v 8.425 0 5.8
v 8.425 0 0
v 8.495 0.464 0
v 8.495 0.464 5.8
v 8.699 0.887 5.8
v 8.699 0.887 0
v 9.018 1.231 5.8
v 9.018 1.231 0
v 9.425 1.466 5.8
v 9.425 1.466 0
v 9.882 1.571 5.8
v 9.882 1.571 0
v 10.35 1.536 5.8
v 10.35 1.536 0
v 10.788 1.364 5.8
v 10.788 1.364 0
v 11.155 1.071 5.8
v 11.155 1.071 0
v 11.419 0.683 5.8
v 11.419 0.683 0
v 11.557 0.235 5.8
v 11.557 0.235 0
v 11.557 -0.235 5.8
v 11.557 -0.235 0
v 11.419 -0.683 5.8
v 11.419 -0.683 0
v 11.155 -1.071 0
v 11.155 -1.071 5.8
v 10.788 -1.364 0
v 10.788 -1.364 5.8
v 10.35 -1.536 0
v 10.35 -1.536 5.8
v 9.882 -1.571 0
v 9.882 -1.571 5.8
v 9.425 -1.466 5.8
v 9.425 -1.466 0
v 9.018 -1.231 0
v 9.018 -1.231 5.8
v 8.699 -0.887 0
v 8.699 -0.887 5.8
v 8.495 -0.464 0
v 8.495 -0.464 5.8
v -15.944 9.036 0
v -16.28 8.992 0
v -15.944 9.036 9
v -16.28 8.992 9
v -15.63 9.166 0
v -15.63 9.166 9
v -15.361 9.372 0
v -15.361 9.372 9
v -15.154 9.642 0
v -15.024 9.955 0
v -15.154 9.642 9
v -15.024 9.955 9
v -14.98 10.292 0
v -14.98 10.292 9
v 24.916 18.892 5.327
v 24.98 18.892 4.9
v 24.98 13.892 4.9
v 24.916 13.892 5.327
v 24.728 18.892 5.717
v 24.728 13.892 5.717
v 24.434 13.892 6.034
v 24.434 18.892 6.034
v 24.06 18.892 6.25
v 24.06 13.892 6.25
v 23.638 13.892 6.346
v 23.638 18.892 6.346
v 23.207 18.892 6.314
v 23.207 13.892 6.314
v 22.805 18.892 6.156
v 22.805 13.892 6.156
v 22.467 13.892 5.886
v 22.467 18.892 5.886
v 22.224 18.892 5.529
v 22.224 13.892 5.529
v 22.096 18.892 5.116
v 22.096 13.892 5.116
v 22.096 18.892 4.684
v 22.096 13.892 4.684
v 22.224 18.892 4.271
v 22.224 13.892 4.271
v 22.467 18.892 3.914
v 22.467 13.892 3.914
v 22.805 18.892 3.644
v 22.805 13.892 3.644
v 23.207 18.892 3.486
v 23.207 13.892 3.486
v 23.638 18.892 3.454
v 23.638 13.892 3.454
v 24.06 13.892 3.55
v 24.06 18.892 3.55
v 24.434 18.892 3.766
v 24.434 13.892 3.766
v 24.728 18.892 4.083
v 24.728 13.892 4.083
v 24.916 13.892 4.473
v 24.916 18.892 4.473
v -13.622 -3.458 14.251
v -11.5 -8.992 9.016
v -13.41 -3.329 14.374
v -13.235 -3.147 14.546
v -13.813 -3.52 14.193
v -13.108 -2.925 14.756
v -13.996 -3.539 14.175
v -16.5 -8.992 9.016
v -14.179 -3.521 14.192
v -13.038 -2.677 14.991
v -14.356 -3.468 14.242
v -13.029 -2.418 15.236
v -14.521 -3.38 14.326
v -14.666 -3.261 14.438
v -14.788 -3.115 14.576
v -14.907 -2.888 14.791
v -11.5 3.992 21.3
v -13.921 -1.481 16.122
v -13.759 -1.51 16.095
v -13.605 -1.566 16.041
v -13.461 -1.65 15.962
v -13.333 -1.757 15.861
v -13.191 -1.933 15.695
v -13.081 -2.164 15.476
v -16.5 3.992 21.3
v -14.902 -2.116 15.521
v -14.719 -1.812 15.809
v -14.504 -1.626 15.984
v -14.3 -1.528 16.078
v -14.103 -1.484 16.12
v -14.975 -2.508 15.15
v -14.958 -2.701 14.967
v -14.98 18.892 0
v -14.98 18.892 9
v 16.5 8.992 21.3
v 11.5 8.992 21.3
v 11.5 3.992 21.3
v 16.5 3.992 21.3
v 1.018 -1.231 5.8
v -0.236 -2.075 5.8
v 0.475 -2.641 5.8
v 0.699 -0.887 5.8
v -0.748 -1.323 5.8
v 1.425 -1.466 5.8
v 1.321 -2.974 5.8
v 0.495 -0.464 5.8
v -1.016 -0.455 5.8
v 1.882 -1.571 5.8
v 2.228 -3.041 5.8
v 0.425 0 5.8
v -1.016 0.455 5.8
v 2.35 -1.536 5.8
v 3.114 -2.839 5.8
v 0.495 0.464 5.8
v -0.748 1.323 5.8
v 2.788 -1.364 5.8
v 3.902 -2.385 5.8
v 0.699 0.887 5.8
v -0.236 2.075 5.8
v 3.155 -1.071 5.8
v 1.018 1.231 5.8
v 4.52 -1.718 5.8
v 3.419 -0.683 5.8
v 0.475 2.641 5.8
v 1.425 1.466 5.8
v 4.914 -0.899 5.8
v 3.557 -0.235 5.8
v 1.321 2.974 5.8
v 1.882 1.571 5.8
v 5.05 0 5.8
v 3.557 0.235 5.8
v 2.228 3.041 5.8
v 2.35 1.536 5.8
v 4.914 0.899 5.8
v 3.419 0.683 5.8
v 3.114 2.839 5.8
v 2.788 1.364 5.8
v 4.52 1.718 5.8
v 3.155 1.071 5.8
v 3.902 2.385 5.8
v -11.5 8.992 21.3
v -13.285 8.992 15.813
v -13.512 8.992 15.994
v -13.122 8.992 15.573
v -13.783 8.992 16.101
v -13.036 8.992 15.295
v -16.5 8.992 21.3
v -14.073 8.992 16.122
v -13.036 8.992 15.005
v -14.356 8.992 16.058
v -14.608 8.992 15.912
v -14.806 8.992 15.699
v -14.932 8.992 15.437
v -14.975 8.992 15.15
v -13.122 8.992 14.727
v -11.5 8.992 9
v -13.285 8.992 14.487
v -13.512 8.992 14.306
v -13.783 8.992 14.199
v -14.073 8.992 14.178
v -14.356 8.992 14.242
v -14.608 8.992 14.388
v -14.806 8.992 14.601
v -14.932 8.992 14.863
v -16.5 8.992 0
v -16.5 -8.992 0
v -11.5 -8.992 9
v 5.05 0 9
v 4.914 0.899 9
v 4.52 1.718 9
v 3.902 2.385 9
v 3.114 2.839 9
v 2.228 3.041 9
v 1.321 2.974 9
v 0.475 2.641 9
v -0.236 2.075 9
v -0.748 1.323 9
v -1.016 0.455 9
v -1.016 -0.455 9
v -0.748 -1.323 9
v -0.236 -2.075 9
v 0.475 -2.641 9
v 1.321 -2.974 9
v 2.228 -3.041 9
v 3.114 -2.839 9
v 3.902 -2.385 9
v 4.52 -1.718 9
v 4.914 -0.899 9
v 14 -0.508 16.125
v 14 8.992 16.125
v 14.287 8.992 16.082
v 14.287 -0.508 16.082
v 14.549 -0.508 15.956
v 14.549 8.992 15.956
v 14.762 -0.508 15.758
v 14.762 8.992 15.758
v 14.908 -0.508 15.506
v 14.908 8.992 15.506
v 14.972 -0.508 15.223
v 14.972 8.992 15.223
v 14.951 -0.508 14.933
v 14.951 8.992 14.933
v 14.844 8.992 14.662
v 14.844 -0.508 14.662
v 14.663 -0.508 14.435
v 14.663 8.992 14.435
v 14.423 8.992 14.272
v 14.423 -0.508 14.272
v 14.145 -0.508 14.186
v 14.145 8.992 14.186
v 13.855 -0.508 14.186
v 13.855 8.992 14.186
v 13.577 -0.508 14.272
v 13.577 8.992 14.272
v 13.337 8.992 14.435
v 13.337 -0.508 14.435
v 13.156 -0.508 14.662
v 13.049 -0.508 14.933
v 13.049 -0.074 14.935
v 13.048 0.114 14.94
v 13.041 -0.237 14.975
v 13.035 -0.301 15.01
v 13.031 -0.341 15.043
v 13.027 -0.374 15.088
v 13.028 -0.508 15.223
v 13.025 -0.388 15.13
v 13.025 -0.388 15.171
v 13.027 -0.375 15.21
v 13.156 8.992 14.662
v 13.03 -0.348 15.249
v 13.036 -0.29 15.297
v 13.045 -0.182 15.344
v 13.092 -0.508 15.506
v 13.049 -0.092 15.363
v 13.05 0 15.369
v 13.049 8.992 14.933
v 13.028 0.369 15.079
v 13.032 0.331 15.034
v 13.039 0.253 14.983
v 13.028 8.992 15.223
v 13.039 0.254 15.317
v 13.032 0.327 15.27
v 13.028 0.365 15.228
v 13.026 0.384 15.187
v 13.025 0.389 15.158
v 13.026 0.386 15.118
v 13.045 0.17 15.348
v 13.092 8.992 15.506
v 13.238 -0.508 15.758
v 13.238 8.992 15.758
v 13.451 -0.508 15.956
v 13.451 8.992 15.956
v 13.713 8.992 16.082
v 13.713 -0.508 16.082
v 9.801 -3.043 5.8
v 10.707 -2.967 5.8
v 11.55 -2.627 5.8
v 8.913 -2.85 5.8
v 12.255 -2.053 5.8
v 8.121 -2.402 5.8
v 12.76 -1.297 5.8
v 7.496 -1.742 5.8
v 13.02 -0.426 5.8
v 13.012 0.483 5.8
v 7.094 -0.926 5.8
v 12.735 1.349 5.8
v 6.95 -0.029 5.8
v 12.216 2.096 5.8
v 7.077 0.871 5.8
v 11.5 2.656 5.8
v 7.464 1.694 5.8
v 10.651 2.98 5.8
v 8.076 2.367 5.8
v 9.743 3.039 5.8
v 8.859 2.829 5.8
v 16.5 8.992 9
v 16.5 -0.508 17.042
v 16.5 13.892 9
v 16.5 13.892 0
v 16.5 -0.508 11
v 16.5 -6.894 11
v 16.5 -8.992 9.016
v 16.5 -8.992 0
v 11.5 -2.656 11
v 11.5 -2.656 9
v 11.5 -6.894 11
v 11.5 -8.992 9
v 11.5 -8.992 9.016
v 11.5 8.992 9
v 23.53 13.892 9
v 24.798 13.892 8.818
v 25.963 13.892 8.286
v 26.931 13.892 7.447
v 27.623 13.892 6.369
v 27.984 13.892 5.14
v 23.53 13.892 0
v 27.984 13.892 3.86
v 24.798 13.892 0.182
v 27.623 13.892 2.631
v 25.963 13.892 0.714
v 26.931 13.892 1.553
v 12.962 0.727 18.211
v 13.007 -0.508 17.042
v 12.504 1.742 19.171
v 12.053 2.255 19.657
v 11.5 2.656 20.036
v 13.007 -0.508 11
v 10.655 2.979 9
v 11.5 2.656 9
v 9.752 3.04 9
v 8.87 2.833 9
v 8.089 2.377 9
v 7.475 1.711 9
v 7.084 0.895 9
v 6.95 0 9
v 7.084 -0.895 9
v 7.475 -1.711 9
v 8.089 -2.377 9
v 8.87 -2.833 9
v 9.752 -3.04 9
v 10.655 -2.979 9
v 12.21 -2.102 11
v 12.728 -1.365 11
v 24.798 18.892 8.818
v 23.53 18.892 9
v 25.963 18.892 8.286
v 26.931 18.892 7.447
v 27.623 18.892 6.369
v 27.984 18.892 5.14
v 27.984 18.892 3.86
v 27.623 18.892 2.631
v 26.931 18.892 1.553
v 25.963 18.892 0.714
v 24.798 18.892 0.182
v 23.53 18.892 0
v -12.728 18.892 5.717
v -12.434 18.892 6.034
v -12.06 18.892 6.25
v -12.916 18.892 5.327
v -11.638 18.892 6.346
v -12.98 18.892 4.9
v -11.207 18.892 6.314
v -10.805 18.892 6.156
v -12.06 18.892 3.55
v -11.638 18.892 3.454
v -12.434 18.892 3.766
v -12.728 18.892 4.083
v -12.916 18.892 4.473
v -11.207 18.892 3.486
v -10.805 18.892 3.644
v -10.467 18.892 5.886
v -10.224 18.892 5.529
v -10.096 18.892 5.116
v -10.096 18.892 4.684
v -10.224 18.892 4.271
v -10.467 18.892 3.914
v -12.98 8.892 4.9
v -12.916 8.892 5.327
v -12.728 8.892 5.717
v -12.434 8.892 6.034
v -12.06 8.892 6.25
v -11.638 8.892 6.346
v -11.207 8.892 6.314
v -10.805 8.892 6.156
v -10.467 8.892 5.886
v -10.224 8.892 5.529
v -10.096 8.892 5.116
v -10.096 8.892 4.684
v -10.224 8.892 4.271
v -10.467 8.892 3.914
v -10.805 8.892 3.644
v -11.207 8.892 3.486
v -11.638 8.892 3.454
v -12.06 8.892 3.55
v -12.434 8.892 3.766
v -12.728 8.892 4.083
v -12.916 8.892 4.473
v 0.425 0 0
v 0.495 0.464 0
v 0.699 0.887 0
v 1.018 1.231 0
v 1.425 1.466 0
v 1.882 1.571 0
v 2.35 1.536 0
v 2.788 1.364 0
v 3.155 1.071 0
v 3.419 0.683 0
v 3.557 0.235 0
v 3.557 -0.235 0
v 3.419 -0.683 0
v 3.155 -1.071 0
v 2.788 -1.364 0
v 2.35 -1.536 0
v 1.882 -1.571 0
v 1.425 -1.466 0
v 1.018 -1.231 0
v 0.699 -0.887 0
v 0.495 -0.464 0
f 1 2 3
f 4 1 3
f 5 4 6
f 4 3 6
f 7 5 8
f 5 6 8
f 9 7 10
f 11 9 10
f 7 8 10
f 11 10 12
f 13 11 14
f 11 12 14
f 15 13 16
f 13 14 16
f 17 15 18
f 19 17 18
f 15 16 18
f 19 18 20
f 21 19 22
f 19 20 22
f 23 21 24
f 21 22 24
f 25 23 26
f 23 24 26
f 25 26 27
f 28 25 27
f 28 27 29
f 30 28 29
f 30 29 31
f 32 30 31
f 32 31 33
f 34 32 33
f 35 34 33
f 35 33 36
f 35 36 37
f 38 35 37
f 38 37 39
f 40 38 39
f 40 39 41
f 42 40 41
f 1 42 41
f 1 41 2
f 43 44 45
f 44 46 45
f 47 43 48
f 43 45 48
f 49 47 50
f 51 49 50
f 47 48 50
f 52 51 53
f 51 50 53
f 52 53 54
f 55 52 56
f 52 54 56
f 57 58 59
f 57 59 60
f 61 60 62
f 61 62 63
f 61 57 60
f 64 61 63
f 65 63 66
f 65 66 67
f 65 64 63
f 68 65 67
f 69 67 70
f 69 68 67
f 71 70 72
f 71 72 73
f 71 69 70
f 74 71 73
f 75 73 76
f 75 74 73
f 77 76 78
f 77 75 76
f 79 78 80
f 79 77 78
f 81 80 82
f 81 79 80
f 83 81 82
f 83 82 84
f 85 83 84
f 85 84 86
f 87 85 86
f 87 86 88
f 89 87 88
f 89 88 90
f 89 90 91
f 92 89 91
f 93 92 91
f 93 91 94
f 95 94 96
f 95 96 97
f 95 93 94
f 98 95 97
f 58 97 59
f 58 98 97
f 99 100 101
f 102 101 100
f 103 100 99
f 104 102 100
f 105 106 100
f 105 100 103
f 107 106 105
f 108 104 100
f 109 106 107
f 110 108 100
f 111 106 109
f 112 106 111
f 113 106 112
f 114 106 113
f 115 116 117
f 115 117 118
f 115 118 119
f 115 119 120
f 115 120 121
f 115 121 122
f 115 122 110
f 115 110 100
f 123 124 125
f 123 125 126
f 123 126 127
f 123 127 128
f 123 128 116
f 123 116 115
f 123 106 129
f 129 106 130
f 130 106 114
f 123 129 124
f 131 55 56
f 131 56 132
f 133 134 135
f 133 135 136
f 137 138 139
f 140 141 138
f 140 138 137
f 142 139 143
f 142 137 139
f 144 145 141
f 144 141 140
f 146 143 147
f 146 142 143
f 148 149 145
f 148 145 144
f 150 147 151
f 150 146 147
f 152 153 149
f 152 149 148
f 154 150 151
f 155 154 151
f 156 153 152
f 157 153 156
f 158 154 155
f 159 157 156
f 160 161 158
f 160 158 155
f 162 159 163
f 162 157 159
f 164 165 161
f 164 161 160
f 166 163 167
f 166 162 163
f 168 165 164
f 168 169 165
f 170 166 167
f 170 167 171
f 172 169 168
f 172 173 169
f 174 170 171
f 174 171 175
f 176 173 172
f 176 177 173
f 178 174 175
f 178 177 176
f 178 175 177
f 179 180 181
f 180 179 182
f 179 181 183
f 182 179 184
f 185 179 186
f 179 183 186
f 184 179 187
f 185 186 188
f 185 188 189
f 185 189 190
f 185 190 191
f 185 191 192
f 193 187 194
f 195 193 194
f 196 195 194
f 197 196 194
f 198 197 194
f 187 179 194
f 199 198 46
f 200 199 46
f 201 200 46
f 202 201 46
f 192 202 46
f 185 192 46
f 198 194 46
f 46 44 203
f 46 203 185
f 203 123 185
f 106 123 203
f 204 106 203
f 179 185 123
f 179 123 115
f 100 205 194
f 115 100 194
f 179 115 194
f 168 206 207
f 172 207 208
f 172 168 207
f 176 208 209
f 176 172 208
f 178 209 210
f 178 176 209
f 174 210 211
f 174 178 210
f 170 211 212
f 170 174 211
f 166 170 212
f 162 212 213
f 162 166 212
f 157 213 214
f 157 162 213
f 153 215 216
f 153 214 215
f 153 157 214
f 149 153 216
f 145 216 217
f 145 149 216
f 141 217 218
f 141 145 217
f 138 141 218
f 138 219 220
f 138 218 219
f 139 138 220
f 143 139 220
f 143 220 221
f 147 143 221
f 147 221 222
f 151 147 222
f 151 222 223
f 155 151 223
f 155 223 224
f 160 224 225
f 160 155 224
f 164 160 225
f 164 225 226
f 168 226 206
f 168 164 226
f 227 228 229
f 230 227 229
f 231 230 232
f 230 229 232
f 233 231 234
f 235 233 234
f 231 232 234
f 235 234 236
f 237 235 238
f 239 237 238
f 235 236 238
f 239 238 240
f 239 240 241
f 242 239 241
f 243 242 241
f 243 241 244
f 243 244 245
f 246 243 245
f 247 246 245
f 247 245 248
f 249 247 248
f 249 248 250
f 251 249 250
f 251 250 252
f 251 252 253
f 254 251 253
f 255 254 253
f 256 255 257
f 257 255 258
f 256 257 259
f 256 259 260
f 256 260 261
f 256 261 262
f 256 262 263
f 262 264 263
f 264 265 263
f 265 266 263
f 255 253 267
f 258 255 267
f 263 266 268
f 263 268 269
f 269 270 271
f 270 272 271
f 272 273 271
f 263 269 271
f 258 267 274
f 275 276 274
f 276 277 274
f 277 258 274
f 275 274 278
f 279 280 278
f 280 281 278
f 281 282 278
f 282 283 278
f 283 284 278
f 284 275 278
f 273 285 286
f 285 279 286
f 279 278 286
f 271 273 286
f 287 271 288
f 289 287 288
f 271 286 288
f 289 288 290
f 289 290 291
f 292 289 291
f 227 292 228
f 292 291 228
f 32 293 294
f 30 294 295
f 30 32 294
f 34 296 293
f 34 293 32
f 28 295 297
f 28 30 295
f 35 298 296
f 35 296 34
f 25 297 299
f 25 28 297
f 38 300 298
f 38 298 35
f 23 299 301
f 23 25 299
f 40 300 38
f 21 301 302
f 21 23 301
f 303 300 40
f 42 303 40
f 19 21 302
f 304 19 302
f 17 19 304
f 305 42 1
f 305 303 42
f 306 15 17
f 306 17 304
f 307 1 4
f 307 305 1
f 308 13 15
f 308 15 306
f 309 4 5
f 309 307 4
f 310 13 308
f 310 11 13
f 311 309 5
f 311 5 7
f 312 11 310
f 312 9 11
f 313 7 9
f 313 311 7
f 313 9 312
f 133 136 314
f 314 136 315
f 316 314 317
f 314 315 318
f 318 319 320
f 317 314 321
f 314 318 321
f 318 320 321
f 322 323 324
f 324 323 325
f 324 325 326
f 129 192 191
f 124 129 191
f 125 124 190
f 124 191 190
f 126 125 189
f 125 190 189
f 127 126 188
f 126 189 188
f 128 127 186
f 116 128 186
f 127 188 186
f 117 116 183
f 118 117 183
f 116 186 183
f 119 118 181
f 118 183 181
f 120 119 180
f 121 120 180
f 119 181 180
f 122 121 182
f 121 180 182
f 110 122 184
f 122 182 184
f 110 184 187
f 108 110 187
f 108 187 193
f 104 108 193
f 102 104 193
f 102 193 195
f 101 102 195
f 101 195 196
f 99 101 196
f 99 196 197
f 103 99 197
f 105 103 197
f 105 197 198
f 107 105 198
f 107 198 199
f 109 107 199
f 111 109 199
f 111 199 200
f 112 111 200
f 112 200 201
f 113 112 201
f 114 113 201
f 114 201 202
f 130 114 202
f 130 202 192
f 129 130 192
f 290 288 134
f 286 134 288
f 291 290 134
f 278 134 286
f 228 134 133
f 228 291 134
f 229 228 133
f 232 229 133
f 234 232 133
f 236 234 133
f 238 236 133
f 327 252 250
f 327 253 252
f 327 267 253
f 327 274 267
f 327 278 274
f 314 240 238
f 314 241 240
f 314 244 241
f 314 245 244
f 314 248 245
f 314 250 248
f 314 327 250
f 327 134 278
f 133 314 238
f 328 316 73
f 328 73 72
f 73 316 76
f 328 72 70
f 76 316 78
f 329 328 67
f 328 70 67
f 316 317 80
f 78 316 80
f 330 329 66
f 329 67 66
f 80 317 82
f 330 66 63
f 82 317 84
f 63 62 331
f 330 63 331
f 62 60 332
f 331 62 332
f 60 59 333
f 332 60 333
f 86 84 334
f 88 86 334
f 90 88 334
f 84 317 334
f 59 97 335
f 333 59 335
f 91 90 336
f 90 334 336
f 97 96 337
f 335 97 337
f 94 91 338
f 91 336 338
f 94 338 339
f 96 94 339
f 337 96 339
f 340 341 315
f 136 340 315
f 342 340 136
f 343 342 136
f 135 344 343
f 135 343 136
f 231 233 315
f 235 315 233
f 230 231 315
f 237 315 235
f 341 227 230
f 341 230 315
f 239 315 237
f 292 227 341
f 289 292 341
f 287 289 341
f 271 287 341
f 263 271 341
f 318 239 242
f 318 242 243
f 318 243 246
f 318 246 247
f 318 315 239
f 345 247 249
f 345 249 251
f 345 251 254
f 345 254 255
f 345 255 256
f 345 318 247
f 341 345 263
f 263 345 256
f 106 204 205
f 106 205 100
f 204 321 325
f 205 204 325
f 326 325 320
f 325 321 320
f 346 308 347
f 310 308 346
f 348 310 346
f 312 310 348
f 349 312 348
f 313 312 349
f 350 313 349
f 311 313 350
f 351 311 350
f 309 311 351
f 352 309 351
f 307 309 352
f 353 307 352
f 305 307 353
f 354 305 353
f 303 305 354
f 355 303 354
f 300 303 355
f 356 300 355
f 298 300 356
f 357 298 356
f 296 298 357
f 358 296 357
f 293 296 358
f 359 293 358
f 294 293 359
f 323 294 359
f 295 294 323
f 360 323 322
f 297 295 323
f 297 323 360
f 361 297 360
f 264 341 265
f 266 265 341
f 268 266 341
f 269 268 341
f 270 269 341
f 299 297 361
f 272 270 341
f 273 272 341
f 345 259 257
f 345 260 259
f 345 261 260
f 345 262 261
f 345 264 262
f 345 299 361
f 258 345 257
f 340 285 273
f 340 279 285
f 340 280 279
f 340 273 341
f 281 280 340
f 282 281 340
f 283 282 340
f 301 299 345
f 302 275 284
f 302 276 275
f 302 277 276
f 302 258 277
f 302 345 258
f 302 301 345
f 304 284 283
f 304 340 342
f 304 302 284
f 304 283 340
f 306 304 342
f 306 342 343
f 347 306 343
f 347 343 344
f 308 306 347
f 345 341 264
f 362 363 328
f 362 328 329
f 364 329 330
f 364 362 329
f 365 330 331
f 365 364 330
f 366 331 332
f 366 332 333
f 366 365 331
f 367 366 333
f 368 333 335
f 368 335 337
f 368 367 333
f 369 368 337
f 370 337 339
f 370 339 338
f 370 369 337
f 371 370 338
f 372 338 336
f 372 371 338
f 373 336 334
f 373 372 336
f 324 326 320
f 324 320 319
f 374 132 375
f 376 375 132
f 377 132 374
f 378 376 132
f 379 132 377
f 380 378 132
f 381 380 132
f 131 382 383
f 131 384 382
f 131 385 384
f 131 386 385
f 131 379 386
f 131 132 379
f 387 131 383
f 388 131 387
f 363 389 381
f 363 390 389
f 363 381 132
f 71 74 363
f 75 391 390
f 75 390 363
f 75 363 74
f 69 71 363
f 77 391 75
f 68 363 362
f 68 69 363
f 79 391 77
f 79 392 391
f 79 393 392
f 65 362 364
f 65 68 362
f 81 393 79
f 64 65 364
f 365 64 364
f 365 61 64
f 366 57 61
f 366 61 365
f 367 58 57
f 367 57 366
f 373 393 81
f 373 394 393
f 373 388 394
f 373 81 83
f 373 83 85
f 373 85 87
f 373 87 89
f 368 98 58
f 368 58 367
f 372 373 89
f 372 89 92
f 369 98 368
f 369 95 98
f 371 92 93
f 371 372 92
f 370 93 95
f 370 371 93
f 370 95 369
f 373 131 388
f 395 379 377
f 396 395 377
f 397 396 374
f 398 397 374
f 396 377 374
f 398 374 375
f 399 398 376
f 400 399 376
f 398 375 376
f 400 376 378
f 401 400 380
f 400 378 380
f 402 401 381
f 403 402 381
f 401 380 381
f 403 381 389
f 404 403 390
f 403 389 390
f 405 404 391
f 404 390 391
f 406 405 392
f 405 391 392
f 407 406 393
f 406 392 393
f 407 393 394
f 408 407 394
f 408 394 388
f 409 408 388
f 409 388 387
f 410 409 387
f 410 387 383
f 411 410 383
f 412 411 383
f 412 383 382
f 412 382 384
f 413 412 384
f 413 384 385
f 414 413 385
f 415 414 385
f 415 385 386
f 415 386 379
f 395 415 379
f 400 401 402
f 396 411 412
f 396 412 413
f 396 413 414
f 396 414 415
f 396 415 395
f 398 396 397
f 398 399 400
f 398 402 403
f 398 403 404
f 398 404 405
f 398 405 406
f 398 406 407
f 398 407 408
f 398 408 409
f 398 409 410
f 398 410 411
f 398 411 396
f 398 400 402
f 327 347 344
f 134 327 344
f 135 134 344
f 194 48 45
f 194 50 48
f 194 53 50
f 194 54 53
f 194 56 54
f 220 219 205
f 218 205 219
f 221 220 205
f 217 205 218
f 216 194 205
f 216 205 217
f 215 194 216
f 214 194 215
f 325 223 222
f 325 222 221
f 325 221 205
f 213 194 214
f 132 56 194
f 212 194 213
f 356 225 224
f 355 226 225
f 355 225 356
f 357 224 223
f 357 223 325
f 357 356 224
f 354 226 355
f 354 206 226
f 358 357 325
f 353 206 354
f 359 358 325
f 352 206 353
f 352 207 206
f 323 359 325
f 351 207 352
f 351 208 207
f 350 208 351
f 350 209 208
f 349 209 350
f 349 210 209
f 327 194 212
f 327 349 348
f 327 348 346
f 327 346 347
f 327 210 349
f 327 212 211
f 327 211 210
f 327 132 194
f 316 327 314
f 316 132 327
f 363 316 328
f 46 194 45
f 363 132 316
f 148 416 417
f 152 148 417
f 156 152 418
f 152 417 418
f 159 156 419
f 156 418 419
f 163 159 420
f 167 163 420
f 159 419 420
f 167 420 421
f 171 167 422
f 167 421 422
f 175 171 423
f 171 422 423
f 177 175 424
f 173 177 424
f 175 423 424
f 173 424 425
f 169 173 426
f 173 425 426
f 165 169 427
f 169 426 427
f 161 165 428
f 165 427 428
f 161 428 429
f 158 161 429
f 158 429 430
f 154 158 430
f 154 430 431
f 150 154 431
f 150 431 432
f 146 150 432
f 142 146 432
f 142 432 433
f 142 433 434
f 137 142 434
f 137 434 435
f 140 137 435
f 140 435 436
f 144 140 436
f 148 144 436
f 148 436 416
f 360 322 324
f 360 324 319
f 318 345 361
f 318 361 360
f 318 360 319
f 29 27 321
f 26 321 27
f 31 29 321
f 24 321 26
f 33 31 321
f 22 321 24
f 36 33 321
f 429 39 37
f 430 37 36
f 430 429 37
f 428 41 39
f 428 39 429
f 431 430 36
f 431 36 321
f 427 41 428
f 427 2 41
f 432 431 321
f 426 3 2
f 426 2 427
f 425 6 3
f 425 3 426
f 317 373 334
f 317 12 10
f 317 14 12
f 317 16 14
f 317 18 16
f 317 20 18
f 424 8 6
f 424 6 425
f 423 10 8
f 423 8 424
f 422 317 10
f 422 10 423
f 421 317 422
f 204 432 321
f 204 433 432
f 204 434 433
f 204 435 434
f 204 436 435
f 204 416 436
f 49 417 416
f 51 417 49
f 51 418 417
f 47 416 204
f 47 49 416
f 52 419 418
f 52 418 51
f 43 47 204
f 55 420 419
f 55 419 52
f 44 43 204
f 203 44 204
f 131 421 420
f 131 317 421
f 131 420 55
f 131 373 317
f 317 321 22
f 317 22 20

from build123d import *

# Parameters (mm, degrees)
SKETCH1_W               = 33
SKETCH1_H               = 17.983376384
BOSS_EXTRUDE1_DEPTH     = 9
SKETCH4_W               = 5
SKETCH4_H               = 12.3
BOSS_EXTRUDE2_DEPTH     = 5
CHAMFER1_SIZE           = 13
CHAMFER1_SIZE_2         = 12.3
SKETCH2_R               = 1.575
CUT_EXTRUDE1_DEPTH      = 29.404057044
CUT_EXTRUDE2_DEPTH      = 23.458638795
CUT_EXTRUDE2_DEPTH_BACK = 3.2
SKETCH3_R               = 3.05
CUT_EXTRUDE3_REACH      = 34.394
SKETCH5_R               = 0.975
SKETCH6_W               = 33
SKETCH6_H               = 9
BOSS_EXTRUDE3_DEPTH     = 9.9
CUT_EXTRUDE4_START      = 2
CUT_EXTRUDE4_DEPTH      = 8
SKETCH8_R               = 1.45
CUT_EXTRUDE5_DEPTH      = 10
SKETCH9_R               = 1.45
BOSS_EXTRUDE4_DEPTH     = 5
SKETCH10_W              = 1.52
SKETCH10_H              = 9.9
CUT_EXTRUDE6_DEPTH      = 9
FILLET1_R               = 1.3


with BuildPart() as part:
    # Sketch1 → Boss-Extrude1 (new body)
    with BuildSketch(Plane.XY):
        Rectangle(SKETCH1_W, SKETCH1_H)
    extrude(amount=BOSS_EXTRUDE1_DEPTH)

    # Sketch4 → Boss-Extrude2 (add)
    with BuildSketch(Plane(origin=(0, 8.991688192, 0), x_dir=(1, 0, 0), z_dir=(0, 1, 0))):
        with Locations((-14, -15.15)):
            Rectangle(SKETCH4_W, SKETCH4_H)
        with Locations((14, -15.15)):
            Rectangle(SKETCH4_W, SKETCH4_H)
    extrude(amount=-BOSS_EXTRUDE2_DEPTH)

    # Chamfer1
    # the kernel refuses this chamfer: 13, 12.3 mm, written as the material it adds along each edge
    with BuildSketch(Plane(origin=(-16.5, 3.991688192, 9), x_dir=(0, -0.9996433463604261, -0.02670543160724426), z_dir=(1, 0, 0))) as chamfer1_piece_1_section:
        Polygon((CHAMFER1_SIZE * 0.99964334636, -CHAMFER1_SIZE * 0.0267054316072), (-CHAMFER1_SIZE_2 * 0.0267054316072, -CHAMFER1_SIZE_2 * 0.99964334636), (0, 0), align=None)
    chamfer1_piece_1 = extrude(amount=5, mode=Mode.PRIVATE)
    chamfer1_piece_1 = split(chamfer1_piece_1, bisect_by=Plane(origin=(-14, -8.991688192, 13.04185716), z_dir=(0, 1, 0)), keep=Keep.TOP, mode=Mode.PRIVATE)
    chamfer1_piece_1 = split(chamfer1_piece_1, bisect_by=Plane(origin=(-14, -0.292838715, 21.3), z_dir=(0, 0, -1)), keep=Keep.TOP, mode=Mode.PRIVATE)
    add(chamfer1_piece_1)
    with BuildSketch(Plane(origin=(-16.5, 3.991688192, 9), x_dir=(0, -0.9996433463604261, -0.02670543160724426), z_dir=(1, 0, 0))) as chamfer1_piece_2_section:
        Polygon((CHAMFER1_SIZE * 0.99964334636, -CHAMFER1_SIZE * 0.0267054316072), (-CHAMFER1_SIZE_2 * 0.0267054316072, -CHAMFER1_SIZE_2 * 0.99964334636), (0, 0), align=None)
    chamfer1_piece_2 = extrude(amount=38.456243217, mode=Mode.PRIVATE)
    chamfer1_piece_2 = split(chamfer1_piece_2, bisect_by=Plane(origin=(14, -8.991688192, 13.04185716), z_dir=(0, 1, 0)), keep=Keep.TOP, mode=Mode.PRIVATE)
    chamfer1_piece_2 = split(chamfer1_piece_2, bisect_by=Plane(origin=(16.5, -0.292838715, 13.04185716), z_dir=(-1, 0, 0)), keep=Keep.TOP, mode=Mode.PRIVATE)
    chamfer1_piece_2 = split(chamfer1_piece_2, bisect_by=Plane(origin=(11.5, -0.292838715, 13.04185716), z_dir=(1, 0, 0)), keep=Keep.TOP, mode=Mode.PRIVATE)
    chamfer1_piece_2 = split(chamfer1_piece_2, bisect_by=Plane(origin=(14, -0.292838715, 21.3), z_dir=(0, 0, -1)), keep=Keep.TOP, mode=Mode.PRIVATE)
    add(chamfer1_piece_2)
    with BuildSketch(Plane(origin=(16.5, 3.991688192, 9), x_dir=(0, -0.9996433463604261, -0.02670543160724426), z_dir=(-1, 0, 0))) as chamfer1_piece_3_section:
        Polygon((CHAMFER1_SIZE * 0.99964334636, CHAMFER1_SIZE * 0.0267054316072), (-CHAMFER1_SIZE_2 * 0.0267054316072, CHAMFER1_SIZE_2 * 0.99964334636), (0, 0), align=None)
    chamfer1_piece_3 = extrude(amount=5, mode=Mode.PRIVATE)
    chamfer1_piece_3 = split(chamfer1_piece_3, bisect_by=Plane(origin=(14, -8.991688192, 13.04185716), z_dir=(0, 1, 0)), keep=Keep.TOP, mode=Mode.PRIVATE)
    chamfer1_piece_3 = split(chamfer1_piece_3, bisect_by=Plane(origin=(14, -0.292838715, 21.3), z_dir=(0, 0, -1)), keep=Keep.TOP, mode=Mode.PRIVATE)
    add(chamfer1_piece_3)
    with BuildSketch(Plane(origin=(16.5, 3.991688192, 9), x_dir=(0, -0.9996433463604261, -0.02670543160724426), z_dir=(-1, 0, 0))) as chamfer1_piece_4_section:
        Polygon((CHAMFER1_SIZE * 0.99964334636, CHAMFER1_SIZE * 0.0267054316072), (-CHAMFER1_SIZE_2 * 0.0267054316072, CHAMFER1_SIZE_2 * 0.99964334636), (0, 0), align=None)
    chamfer1_piece_4 = extrude(amount=38.456243217, mode=Mode.PRIVATE)
    chamfer1_piece_4 = split(chamfer1_piece_4, bisect_by=Plane(origin=(-14, -8.991688192, 13.04185716), z_dir=(0, 1, 0)), keep=Keep.TOP, mode=Mode.PRIVATE)
    chamfer1_piece_4 = split(chamfer1_piece_4, bisect_by=Plane(origin=(-16.5, -0.292838715, 13.04185716), z_dir=(1, 0, 0)), keep=Keep.TOP, mode=Mode.PRIVATE)
    chamfer1_piece_4 = split(chamfer1_piece_4, bisect_by=Plane(origin=(-14, -0.292838715, 21.3), z_dir=(0, 0, -1)), keep=Keep.TOP, mode=Mode.PRIVATE)
    chamfer1_piece_4 = split(chamfer1_piece_4, bisect_by=Plane(origin=(-11.5, -0.292838715, 13.04185716), z_dir=(-1, 0, 0)), keep=Keep.TOP, mode=Mode.PRIVATE)
    add(chamfer1_piece_4)

    # Sketch2 → Cut-Extrude1 (cut, through all)
    with BuildSketch(Plane(origin=(0, 0, 0), x_dir=(-1, 0, 0), z_dir=(0, 0, -1))):
        with Locations((-2, 0)):
            Circle(SKETCH2_R)
        with Locations((-10, 0)):
            Circle(SKETCH2_R)
    extrude(amount=-CUT_EXTRUDE1_DEPTH, mode=Mode.SUBTRACT)

    # Sketch3 → Cut-Extrude2 (cut, two sides: drawn at the far end of the back side and taken through both)
    with BuildSketch(Plane.XY.offset(9).offset(-CUT_EXTRUDE2_DEPTH_BACK)):
        with Locations((2, 0)):
            Circle(SKETCH3_R)
        with Locations(Location((10, 0, 0), (0, 0, 60.540825088))):
            Circle(SKETCH3_R)
    extrude(amount=CUT_EXTRUDE2_DEPTH + CUT_EXTRUDE2_DEPTH_BACK, mode=Mode.SUBTRACT)

    # Cut-Extrude3: up to this plane
    cut_extrude3_end = Plane(origin=(0, -9.008311808, 9), z_dir=(0, 0.6872795500600087, -0.726393020388627))
    # Sketch5 → Cut-Extrude3 (cut, up to the surface)
    with BuildSketch(Plane(origin=(0, 8.991688192, 0), x_dir=(1, 0, 0), z_dir=(0, 1, 0)), mode=Mode.PRIVATE) as cut_extrude3_sk1:
        with Locations(Location((-14, -15.15, 0), (0, 0, 180))):
            Circle(SKETCH5_R)
    cut_extrude3_tool1 = split(extrude(cut_extrude3_sk1.sketch, amount=-CUT_EXTRUDE3_REACH, mode=Mode.PRIVATE), bisect_by=cut_extrude3_end, keep=Keep.BOTH, mode=Mode.PRIVATE)
    add(cut_extrude3_tool1.solids().sort_by_distance((-14, 8.991688, 15.15))[0], mode=Mode.SUBTRACT)
    # Sketch5 → Cut-Extrude3 (cut, up to the surface)
    with BuildSketch(Plane(origin=(0, 8.991688192, 0), x_dir=(1, 0, 0), z_dir=(0, 1, 0)), mode=Mode.PRIVATE) as cut_extrude3_sk2:
        with Locations(Location((14, -15.15, 0), (0, 0, 270))):
            Circle(SKETCH5_R)
    cut_extrude3_tool2 = split(extrude(cut_extrude3_sk2.sketch, amount=-CUT_EXTRUDE3_REACH, mode=Mode.PRIVATE), bisect_by=cut_extrude3_end, keep=Keep.BOTH, mode=Mode.PRIVATE)
    add(cut_extrude3_tool2.solids().sort_by_distance((14, 8.991688, 15.15))[0], mode=Mode.SUBTRACT)

    # Sketch6 → Boss-Extrude3 (add)
    with BuildSketch(Plane(origin=(0, 8.991688192, 0), x_dir=(1, 0, 0), z_dir=(0, 1, 0))):
        with Locations((0, -4.5)):
            Rectangle(SKETCH6_W, SKETCH6_H)
    extrude(amount=BOSS_EXTRUDE3_DEPTH)

    # Sketch7 → Cut-Extrude4 (cut)
    with BuildSketch(Plane.XY.offset(9).offset(CUT_EXTRUDE4_START)):
        Polygon((11.5, -2.655654345), (11.5, -5.508311808), (16.5, -5.508311808), (16.5, -0.508311808), (11.5, -0.508311808), align=None)
        Polygon((16.5, -5.508311808), (11.5, -5.508311808), (11.5, -8.991688192), (11.5, -10.104288395), (16.5, -10.104288395), align=None)
    extrude(amount=CUT_EXTRUDE4_DEPTH, mode=Mode.SUBTRACT)

    # Sketch8 → Cut-Extrude5 (cut)
    with BuildSketch(Plane(origin=(0, 18.891688192, 0), x_dir=(1, 0, 0), z_dir=(0, 1, 0))):
        with Locations(Location((-11.53, -4.9, 0), (0, 0, 180))):
            Circle(SKETCH8_R)
    cut_extrude5 = extrude(amount=-CUT_EXTRUDE5_DEPTH, mode=Mode.SUBTRACT)

    # Sketch9 → Boss-Extrude4 (add)
    with BuildSketch(Plane(origin=(0, 18.891688192, 0), x_dir=(1, 0, 0), z_dir=(0, 1, 0))):
        with BuildLine():
            Line((-11.53, 0), (-1.44116457, 0))
            ThreePointArc((-1.44116457, 0), (3.05883543, -4.5), (-1.44116457, -9))
            Line((-1.44116457, -9), (-11.53, -9))
            ThreePointArc((-11.53, -9), (-16.03, -4.5), (-11.53, 0))
        make_face()
        with Locations(Location((-11.53, -4.9, 0), (0, 0, 180))):
            Circle(SKETCH9_R, mode=Mode.SUBTRACT)
    boss_extrude4 = extrude(amount=-BOSS_EXTRUDE4_DEPTH)

    # Mirror1: Cut-Extrude5, Boss-Extrude4 across plane
    add(cut_extrude5.mirror(Plane(origin=(6, 0, 0), x_dir=(0, 0, 1), z_dir=(1, 0, 0))), mode=Mode.SUBTRACT)
    add(boss_extrude4.mirror(Plane(origin=(6, 0, 0), x_dir=(0, 0, 1), z_dir=(1, 0, 0))))

    # Sketch10 → Cut-Extrude6 (cut)
    with BuildSketch(Plane(origin=(0, 0, 0), x_dir=(-1, 0, 0), z_dir=(0, 0, -1))):
        with Locations((15.74, 13.941688192)):
            Rectangle(SKETCH10_W, SKETCH10_H)
    extrude(amount=-CUT_EXTRUDE6_DEPTH, mode=Mode.SUBTRACT)

    # Fillet1
    fillet1_edges = [part.edges().sort_by_distance(p)[0] for p in [
        (-14.98, 8.991688192, 4.5),
    ]]
    fillet(fillet1_edges, radius=FILLET1_R)


solid = part.part
